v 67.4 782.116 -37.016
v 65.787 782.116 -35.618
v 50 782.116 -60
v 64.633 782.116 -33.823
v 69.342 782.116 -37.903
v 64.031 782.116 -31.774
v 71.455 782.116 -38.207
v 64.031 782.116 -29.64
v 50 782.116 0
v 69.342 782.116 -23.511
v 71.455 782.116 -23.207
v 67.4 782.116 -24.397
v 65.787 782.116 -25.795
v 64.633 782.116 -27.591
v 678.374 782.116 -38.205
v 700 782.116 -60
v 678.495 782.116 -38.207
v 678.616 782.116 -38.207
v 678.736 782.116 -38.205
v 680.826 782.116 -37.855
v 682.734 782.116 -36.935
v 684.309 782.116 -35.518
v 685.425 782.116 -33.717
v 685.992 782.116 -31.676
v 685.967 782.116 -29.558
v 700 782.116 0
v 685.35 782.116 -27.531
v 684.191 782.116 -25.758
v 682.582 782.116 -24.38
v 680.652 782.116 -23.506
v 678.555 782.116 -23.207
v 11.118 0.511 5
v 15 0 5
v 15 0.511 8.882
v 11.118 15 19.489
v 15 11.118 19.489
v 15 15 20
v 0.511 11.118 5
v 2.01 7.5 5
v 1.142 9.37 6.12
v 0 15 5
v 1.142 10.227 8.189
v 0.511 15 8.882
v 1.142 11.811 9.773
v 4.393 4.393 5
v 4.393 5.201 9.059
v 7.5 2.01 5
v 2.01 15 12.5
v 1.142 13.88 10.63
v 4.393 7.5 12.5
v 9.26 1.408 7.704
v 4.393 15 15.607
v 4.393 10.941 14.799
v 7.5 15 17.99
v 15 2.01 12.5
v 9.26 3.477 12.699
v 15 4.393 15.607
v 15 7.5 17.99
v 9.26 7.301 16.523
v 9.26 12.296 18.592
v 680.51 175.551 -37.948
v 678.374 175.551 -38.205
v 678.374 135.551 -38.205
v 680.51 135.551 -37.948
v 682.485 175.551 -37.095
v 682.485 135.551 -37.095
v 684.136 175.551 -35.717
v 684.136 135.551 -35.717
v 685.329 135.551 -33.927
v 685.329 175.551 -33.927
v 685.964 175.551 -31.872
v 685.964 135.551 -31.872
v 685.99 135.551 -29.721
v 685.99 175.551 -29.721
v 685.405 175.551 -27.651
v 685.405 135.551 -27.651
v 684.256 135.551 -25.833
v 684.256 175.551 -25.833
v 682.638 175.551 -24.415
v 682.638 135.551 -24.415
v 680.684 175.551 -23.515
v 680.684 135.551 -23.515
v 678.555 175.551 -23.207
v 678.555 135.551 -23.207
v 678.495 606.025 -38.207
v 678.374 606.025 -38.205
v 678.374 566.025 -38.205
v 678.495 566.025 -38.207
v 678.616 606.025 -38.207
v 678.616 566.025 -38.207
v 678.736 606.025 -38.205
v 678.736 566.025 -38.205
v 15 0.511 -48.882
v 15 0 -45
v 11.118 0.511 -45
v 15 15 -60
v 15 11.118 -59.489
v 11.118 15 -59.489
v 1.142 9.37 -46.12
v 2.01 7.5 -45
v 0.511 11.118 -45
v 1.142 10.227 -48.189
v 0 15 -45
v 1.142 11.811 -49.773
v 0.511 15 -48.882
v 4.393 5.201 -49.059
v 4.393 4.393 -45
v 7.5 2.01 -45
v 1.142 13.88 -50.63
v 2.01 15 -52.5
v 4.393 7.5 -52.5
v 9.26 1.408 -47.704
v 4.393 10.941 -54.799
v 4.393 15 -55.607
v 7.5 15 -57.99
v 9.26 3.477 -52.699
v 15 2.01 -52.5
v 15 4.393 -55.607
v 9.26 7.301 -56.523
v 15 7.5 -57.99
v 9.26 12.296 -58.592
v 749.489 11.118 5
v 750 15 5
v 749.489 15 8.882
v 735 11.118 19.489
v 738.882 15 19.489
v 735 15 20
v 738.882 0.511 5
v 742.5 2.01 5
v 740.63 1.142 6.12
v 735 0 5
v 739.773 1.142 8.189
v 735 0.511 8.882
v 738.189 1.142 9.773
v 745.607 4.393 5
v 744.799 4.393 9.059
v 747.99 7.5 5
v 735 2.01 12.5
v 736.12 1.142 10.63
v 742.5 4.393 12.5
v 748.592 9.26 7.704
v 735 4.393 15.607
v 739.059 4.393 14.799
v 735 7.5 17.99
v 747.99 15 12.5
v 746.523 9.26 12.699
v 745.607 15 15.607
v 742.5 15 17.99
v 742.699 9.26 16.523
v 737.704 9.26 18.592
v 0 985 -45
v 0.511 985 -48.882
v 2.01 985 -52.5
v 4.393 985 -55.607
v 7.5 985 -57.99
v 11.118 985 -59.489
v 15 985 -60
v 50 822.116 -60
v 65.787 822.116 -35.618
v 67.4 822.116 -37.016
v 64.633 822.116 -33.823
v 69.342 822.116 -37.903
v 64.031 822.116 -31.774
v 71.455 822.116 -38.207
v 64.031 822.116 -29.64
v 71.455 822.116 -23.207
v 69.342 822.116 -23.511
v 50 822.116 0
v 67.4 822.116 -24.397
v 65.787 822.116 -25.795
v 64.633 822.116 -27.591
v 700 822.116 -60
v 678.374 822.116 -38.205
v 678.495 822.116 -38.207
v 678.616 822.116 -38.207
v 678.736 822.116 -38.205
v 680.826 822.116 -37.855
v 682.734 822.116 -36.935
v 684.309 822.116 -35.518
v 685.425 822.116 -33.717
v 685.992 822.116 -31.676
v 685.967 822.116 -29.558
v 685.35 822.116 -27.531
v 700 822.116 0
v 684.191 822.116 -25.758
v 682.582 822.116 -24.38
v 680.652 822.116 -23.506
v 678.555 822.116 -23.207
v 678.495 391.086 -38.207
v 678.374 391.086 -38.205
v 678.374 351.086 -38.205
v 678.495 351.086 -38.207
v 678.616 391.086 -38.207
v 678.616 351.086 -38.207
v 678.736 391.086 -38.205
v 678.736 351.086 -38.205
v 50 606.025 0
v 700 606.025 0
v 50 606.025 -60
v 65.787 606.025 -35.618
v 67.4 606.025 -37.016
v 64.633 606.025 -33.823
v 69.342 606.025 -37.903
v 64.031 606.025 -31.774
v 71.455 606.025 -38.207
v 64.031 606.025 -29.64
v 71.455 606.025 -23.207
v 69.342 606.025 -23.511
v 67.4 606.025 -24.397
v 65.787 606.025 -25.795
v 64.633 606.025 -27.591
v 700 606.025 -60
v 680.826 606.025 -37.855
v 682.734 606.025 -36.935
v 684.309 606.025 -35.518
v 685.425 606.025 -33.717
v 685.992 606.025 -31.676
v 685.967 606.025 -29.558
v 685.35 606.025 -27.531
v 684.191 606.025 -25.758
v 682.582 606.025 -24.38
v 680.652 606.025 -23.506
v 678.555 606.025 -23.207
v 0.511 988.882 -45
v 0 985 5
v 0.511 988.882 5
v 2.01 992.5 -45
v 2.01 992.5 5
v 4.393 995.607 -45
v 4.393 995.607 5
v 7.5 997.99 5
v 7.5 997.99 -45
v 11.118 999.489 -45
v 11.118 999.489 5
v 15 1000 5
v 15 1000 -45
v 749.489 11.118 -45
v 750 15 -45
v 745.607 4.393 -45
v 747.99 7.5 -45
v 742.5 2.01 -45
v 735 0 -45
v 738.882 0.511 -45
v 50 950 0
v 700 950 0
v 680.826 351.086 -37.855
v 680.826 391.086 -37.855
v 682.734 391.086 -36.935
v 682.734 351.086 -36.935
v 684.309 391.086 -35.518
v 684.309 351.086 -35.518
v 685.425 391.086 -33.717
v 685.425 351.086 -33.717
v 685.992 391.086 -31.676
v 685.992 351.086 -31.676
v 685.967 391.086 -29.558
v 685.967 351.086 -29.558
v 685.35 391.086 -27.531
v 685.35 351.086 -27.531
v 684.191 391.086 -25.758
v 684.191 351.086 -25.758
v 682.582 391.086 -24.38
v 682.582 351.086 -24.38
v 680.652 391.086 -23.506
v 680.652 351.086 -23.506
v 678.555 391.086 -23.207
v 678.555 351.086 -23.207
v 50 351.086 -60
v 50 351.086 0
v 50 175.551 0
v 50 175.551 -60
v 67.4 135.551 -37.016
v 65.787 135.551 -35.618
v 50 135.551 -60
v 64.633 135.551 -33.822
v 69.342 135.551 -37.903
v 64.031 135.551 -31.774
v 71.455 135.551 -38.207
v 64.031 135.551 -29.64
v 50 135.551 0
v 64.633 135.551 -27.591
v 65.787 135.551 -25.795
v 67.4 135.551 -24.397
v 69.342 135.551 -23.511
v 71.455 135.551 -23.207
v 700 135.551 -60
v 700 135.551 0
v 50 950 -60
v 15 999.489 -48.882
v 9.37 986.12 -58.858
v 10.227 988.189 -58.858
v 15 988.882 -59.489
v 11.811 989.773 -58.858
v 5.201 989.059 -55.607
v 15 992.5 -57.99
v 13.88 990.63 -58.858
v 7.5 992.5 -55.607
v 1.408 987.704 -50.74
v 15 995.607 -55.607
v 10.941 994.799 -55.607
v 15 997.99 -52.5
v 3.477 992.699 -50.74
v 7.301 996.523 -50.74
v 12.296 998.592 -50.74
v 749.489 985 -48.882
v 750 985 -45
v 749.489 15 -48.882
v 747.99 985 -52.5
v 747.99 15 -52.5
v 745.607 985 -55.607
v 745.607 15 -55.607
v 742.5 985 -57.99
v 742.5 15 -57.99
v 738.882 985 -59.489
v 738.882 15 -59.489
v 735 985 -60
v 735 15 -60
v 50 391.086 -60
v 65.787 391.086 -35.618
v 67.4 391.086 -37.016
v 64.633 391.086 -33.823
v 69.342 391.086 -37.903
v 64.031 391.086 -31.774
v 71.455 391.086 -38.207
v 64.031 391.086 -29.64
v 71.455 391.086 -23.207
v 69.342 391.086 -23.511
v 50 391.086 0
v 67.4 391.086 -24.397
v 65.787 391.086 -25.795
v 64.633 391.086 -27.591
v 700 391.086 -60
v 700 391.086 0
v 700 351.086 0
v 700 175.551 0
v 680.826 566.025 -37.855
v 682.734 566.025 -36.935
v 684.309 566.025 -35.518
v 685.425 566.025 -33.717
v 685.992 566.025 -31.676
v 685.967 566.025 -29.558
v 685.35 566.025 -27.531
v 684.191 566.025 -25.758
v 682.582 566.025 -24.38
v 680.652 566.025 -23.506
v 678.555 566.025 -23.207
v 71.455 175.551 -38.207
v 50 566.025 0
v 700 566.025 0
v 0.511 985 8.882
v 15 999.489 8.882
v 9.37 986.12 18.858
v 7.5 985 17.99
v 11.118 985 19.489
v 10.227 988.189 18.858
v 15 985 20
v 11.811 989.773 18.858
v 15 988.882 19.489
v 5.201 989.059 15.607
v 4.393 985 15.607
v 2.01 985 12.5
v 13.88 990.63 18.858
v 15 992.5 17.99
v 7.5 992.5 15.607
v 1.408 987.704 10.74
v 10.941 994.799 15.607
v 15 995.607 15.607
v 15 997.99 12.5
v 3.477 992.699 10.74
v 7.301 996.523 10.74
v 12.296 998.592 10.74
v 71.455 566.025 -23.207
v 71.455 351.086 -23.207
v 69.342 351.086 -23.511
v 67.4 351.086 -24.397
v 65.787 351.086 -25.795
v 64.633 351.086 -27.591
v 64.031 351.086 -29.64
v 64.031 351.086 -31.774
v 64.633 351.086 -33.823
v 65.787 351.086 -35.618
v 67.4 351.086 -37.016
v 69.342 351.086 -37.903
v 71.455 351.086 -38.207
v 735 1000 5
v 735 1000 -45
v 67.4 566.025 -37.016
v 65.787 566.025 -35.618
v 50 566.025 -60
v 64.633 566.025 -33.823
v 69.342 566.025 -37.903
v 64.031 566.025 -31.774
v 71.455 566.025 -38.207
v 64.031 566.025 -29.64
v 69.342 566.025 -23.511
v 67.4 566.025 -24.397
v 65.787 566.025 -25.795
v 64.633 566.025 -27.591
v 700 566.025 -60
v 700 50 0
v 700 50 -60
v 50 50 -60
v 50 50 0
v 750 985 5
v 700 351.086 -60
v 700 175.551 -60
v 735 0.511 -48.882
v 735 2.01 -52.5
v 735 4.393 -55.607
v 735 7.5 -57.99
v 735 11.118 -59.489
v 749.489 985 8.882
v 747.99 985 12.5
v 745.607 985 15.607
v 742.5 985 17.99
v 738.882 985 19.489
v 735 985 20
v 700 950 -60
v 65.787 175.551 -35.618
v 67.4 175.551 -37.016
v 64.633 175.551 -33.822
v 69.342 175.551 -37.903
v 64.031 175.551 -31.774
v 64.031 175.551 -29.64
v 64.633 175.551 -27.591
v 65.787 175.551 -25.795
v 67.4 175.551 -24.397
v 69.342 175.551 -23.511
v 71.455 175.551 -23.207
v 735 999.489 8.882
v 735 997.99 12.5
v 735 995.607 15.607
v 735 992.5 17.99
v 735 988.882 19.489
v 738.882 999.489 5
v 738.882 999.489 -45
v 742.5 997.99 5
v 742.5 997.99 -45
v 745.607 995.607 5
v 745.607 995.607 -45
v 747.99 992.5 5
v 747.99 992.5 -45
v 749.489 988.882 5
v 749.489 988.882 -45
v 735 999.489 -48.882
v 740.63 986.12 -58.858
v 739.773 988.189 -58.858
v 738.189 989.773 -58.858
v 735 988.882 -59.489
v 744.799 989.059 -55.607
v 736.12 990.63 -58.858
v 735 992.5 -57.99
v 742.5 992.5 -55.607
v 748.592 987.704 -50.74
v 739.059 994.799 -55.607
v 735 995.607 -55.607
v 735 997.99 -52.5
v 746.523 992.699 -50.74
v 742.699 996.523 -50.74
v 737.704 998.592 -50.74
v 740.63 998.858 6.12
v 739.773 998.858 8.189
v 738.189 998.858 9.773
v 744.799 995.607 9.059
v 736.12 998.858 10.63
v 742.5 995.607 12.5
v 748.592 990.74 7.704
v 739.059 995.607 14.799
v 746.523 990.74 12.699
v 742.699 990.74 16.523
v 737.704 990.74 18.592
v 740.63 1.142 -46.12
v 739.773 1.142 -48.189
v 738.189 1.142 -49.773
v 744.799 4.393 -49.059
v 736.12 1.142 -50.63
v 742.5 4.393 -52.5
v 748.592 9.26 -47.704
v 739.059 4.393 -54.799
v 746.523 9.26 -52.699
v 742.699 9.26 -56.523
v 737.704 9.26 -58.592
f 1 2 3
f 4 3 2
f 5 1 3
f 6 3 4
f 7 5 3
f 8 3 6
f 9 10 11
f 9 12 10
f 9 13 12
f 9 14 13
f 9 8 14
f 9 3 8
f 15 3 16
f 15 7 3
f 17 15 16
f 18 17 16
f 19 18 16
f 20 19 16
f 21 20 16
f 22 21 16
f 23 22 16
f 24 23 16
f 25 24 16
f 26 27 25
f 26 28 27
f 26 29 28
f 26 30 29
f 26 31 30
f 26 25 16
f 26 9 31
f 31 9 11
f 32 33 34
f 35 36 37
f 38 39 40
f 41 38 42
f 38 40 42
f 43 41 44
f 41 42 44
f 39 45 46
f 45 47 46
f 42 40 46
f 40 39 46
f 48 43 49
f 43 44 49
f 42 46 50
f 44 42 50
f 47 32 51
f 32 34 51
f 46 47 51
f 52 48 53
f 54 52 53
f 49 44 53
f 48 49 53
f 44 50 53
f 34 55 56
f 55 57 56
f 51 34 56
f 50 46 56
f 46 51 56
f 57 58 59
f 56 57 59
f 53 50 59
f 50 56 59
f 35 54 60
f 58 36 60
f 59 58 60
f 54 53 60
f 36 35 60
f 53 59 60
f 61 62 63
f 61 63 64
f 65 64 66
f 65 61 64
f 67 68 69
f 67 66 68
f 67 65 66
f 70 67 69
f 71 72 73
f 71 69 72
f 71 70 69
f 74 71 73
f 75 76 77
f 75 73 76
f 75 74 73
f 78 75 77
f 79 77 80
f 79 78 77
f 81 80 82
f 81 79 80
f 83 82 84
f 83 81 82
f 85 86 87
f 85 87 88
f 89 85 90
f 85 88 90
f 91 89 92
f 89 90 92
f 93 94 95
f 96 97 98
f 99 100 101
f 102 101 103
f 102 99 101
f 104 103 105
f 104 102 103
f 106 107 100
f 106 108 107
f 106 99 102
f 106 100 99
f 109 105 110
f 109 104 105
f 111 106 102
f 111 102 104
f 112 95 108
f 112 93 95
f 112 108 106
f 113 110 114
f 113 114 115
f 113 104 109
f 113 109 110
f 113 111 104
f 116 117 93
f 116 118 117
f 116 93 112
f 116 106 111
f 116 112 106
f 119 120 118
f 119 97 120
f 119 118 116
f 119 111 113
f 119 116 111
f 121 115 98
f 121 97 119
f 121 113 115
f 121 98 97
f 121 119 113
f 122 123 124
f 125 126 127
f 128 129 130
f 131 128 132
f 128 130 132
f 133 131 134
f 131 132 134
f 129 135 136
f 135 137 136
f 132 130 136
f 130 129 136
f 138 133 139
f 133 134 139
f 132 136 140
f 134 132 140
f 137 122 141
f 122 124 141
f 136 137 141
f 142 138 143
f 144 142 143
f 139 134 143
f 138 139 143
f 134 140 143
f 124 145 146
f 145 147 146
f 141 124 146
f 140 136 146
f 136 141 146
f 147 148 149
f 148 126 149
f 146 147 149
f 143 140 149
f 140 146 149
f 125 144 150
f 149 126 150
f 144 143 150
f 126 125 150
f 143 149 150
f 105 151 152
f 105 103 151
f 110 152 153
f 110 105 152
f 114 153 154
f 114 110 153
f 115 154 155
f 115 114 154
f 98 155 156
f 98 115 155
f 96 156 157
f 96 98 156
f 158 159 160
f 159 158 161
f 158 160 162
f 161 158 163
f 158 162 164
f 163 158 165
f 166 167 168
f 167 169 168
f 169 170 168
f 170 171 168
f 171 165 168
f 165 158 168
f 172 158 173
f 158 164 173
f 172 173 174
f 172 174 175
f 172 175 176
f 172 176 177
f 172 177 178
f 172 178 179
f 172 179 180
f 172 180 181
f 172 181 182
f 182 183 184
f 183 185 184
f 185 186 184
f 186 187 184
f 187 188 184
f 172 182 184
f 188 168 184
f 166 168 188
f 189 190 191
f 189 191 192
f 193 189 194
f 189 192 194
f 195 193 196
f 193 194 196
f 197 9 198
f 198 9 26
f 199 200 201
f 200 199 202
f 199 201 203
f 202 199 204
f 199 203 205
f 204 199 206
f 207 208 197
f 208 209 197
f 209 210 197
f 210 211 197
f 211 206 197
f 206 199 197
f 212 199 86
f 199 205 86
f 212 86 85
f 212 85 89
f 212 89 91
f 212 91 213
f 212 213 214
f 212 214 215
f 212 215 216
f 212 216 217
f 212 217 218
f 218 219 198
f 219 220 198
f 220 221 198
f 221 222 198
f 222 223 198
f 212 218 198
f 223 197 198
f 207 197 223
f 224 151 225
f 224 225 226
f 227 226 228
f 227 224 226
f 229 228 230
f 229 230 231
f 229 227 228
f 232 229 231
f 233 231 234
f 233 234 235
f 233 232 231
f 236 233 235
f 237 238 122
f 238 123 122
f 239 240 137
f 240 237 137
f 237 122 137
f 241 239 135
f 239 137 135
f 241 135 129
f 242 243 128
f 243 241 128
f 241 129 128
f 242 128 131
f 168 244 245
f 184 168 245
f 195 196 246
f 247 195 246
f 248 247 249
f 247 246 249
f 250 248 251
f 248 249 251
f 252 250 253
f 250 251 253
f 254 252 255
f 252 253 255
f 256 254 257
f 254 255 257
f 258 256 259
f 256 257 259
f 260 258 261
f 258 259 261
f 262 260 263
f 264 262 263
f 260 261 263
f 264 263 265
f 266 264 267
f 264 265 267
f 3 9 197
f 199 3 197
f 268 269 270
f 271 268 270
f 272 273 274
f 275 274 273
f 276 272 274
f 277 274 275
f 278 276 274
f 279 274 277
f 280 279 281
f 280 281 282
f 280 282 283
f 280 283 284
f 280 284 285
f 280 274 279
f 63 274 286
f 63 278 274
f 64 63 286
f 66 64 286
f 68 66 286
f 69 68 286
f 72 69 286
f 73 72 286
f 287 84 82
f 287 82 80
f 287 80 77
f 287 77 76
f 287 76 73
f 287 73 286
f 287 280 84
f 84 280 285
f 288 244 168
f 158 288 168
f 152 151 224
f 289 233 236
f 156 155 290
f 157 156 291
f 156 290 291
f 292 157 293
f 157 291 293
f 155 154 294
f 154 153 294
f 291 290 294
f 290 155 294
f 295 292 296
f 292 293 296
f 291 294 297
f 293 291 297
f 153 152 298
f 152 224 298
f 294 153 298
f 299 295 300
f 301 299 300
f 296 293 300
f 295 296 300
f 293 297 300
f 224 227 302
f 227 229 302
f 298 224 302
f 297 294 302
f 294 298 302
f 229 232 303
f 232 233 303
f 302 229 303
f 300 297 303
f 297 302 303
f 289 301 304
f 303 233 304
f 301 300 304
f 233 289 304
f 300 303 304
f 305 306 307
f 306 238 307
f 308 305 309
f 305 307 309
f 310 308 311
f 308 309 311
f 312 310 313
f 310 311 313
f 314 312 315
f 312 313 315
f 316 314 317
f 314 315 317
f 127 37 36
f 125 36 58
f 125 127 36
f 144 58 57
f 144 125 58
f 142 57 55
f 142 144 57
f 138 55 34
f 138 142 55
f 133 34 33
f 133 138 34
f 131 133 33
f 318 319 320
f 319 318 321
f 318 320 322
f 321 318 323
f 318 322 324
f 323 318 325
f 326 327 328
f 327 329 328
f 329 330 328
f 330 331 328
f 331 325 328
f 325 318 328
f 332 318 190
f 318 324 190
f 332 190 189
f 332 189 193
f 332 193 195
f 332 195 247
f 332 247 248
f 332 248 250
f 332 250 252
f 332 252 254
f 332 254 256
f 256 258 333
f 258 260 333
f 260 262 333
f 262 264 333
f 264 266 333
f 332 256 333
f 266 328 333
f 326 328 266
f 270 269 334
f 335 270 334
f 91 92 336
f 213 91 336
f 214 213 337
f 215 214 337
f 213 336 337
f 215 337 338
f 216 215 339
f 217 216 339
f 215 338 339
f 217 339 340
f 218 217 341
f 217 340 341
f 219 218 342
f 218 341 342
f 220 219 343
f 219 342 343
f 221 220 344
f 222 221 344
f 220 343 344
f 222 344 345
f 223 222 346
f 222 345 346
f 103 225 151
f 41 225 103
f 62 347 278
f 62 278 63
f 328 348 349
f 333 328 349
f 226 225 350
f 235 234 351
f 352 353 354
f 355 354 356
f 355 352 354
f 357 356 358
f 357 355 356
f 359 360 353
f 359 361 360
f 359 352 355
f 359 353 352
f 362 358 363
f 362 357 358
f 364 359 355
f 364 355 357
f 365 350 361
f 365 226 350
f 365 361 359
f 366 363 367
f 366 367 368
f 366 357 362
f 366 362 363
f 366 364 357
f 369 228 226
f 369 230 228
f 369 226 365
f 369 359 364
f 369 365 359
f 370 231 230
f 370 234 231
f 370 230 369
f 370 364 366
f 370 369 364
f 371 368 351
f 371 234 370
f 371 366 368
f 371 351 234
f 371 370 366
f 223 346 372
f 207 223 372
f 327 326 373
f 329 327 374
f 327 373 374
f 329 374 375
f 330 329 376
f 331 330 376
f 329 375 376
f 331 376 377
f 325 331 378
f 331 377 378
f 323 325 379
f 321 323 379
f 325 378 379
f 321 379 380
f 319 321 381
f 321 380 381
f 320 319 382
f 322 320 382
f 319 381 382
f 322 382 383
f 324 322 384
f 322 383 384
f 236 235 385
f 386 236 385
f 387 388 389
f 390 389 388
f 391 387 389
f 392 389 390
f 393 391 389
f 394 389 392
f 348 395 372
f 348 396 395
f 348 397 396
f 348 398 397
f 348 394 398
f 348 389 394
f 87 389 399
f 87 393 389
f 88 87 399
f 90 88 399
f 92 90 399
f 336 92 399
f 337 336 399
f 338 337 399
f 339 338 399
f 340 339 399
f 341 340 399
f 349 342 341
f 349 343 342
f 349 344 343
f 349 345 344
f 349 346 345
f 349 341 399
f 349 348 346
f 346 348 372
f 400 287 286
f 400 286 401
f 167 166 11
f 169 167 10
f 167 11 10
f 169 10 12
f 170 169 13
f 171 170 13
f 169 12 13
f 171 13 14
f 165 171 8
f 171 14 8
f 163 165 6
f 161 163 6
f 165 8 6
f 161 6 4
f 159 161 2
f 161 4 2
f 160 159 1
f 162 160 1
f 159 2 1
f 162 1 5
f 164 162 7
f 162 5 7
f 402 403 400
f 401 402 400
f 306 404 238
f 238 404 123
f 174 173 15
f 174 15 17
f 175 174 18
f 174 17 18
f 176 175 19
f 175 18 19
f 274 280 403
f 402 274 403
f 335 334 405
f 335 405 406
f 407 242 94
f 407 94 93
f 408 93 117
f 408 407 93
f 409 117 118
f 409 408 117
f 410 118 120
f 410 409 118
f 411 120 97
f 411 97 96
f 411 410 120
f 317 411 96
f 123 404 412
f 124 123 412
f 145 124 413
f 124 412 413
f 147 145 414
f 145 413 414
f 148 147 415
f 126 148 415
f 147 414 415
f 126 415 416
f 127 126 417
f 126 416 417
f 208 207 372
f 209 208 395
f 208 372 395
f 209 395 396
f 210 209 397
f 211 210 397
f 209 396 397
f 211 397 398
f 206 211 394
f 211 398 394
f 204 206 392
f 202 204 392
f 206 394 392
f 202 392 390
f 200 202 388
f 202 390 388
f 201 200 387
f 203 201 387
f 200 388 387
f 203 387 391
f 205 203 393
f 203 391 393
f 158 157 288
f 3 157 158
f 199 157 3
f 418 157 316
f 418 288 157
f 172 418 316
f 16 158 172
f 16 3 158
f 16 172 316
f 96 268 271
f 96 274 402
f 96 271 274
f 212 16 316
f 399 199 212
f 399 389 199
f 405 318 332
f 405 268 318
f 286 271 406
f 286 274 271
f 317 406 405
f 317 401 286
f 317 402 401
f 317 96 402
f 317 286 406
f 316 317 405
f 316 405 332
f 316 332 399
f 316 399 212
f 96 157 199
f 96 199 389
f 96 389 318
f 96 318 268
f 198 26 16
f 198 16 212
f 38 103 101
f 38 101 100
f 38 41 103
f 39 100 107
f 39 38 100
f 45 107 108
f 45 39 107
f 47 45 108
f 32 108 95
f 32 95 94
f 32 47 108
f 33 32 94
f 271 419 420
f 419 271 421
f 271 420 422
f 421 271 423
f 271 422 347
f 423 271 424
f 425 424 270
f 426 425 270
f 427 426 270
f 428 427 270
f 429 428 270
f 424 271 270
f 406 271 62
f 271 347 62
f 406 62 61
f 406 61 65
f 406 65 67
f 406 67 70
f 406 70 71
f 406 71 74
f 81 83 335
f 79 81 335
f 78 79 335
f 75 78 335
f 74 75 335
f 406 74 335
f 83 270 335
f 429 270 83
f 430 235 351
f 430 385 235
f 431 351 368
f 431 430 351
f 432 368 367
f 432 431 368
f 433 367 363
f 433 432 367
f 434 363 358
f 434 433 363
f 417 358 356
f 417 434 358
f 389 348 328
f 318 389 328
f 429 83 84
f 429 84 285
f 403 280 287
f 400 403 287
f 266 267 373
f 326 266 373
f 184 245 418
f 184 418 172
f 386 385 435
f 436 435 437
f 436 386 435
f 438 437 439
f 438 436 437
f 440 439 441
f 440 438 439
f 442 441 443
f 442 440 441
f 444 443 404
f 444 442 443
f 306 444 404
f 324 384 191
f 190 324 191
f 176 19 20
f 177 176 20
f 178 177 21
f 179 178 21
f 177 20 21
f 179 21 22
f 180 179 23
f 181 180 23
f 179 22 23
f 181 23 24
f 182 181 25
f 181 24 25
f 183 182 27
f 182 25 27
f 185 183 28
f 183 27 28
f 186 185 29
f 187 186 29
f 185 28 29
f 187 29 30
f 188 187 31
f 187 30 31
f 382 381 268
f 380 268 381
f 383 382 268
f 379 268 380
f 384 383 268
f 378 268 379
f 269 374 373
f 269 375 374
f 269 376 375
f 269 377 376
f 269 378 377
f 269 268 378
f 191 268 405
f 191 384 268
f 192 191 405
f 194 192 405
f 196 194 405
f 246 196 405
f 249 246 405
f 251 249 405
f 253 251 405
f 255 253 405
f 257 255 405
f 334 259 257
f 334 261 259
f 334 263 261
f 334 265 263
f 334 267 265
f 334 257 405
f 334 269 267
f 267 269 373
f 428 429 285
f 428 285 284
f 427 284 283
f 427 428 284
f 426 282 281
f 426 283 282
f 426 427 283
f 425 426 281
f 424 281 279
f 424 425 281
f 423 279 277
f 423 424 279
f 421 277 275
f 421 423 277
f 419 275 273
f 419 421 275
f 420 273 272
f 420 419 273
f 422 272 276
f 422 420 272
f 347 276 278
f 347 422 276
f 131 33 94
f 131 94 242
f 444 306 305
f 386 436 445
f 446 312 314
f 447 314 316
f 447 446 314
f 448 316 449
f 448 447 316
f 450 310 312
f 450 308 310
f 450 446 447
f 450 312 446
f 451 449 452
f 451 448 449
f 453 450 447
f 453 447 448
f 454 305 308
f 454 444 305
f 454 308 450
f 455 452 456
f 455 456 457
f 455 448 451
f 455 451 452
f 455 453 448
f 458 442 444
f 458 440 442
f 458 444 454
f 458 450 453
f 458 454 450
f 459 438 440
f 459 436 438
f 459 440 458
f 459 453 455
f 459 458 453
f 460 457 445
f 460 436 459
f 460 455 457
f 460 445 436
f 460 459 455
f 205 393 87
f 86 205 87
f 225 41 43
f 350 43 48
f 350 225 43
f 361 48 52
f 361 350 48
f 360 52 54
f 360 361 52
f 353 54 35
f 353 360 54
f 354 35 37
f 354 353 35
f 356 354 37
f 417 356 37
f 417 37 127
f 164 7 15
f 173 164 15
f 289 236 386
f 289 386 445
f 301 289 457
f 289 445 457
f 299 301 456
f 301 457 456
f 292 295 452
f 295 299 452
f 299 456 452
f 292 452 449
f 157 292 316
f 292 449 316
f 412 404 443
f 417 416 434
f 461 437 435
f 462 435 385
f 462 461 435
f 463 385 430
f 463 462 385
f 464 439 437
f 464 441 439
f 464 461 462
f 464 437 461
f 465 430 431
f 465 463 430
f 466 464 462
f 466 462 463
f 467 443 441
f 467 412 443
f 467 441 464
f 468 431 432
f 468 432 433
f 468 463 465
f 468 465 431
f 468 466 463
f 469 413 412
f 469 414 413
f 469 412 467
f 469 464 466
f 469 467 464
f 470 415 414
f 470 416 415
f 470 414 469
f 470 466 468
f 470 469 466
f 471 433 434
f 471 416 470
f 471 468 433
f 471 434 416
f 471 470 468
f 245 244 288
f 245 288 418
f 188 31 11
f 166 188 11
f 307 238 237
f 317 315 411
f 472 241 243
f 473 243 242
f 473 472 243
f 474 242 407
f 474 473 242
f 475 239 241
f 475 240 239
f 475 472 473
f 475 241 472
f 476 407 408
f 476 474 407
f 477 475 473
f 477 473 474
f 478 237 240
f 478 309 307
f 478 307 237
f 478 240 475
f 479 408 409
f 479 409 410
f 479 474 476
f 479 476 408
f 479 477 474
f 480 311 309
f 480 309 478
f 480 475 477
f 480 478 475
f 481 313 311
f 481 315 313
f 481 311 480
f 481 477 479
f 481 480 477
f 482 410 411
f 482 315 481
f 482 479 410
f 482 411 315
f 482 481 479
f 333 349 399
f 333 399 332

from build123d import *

# Parameters (mm, degrees)
F0_W      = 750
F0_H      = 1000
F1_DEPTH  = 20
F2_W      = 750
F2_H      = 1000
F2_W_2    = 650
F2_H_2    = 900
F3_DEPTH  = 60
F4_R      = 15
F5_W      = 650
F5_H      = 40
F6_DEPTH  = 60
F8_DEPTH  = 500
F10_DEPTH = 242


with BuildPart() as f1:
    # F0 (on Top) → F1 (new body)
    with BuildSketch(Plane.XY):
        with Locations((375, 500)):
            Rectangle(F0_W, F0_H)
    extrude(amount=F1_DEPTH)

    # F2 (on face) → F3 (join)
    with BuildSketch(Plane(origin=(0, 0, 0), x_dir=(1, 0, 0), z_dir=(0, 0, -1))):
        with Locations((375, -500)):
            Rectangle(F2_W, F2_H)
        with Locations((375, -500)):
            Rectangle(F2_W_2, F2_H_2, mode=Mode.SUBTRACT)
    extrude(amount=F3_DEPTH)

    # F4
    f4_edges = [f1.edges().sort_by_distance(p)[0] for p in [
        (750, 500, 20),
        (750, 1000, -20),
        (750, 500, -60),
        (750, 0, -20),
        (375, 0, 20),
        (375, 0, -60),
        (0, 0, -20),
        (0, 1000, -20),
        (0, 500, 20),
        (0, 500, -60),
        (375, 1000, 20),
        (375, 1000, -60),
    ]]
    fillet(f4_edges, radius=F4_R)

    # F5 (on face) → F6 (join)
    with BuildSketch(Plane(origin=(0, 0, 0), x_dir=(1, 0, 0), z_dir=(0, 0, -1))):
        with Locations((375, -155.55052)):
            Rectangle(F5_W, F5_H)
        with Locations((375, -371.085923)):
            Rectangle(F5_W, F5_H)
        with Locations((375, -586.024683)):
            Rectangle(F5_W, F5_H)
        with Locations((375, -802.115779)):
            Rectangle(F5_W, F5_H)
    extrude(amount=F6_DEPTH)

    # F7 (on face) → F8 (cut)
    with BuildSketch(Plane.XZ.offset(-351.085923)):
        with BuildLine():
            Line((678.736282, -38.204683), (678.374153, -38.204684))
            ThreePointArc((678.374153, -38.204684), (678.555218, -38.206869), (678.736282, -38.204683))
        make_face()
        with BuildLine():
            Line((71.454815, -38.206869), (678.374153, -38.204684))
            Line((678.374153, -38.204684), (678.736282, -38.204683))
            ThreePointArc((678.736282, -38.204683), (686.054644, -30.616317), (678.55519, -23.206869))
            Line((678.55519, -23.206869), (71.454761, -23.206876))
            ThreePointArc((71.454761, -23.206876), (63.954792, -30.7069), (71.454815, -38.206869))
        make_face()
    extrude(amount=-F8_DEPTH, mode=Mode.SUBTRACT)

    # F9 (on face) → F10 (cut)
    with BuildSketch(Plane.XZ.offset(-351.085923)):
        with BuildLine():
            Line((678.55519, -23.206869), (71.454788, -23.206876))
            ThreePointArc((71.454788, -23.206876), (63.954792, -30.706886), (71.454815, -38.206869))
            Line((71.454815, -38.206869), (678.374153, -38.204684))
            ThreePointArc((678.374153, -38.204684), (686.054644, -30.797395), (678.55519, -23.206869))
        make_face()
    extrude(amount=F10_DEPTH, mode=Mode.SUBTRACT)


solid = f1.part
